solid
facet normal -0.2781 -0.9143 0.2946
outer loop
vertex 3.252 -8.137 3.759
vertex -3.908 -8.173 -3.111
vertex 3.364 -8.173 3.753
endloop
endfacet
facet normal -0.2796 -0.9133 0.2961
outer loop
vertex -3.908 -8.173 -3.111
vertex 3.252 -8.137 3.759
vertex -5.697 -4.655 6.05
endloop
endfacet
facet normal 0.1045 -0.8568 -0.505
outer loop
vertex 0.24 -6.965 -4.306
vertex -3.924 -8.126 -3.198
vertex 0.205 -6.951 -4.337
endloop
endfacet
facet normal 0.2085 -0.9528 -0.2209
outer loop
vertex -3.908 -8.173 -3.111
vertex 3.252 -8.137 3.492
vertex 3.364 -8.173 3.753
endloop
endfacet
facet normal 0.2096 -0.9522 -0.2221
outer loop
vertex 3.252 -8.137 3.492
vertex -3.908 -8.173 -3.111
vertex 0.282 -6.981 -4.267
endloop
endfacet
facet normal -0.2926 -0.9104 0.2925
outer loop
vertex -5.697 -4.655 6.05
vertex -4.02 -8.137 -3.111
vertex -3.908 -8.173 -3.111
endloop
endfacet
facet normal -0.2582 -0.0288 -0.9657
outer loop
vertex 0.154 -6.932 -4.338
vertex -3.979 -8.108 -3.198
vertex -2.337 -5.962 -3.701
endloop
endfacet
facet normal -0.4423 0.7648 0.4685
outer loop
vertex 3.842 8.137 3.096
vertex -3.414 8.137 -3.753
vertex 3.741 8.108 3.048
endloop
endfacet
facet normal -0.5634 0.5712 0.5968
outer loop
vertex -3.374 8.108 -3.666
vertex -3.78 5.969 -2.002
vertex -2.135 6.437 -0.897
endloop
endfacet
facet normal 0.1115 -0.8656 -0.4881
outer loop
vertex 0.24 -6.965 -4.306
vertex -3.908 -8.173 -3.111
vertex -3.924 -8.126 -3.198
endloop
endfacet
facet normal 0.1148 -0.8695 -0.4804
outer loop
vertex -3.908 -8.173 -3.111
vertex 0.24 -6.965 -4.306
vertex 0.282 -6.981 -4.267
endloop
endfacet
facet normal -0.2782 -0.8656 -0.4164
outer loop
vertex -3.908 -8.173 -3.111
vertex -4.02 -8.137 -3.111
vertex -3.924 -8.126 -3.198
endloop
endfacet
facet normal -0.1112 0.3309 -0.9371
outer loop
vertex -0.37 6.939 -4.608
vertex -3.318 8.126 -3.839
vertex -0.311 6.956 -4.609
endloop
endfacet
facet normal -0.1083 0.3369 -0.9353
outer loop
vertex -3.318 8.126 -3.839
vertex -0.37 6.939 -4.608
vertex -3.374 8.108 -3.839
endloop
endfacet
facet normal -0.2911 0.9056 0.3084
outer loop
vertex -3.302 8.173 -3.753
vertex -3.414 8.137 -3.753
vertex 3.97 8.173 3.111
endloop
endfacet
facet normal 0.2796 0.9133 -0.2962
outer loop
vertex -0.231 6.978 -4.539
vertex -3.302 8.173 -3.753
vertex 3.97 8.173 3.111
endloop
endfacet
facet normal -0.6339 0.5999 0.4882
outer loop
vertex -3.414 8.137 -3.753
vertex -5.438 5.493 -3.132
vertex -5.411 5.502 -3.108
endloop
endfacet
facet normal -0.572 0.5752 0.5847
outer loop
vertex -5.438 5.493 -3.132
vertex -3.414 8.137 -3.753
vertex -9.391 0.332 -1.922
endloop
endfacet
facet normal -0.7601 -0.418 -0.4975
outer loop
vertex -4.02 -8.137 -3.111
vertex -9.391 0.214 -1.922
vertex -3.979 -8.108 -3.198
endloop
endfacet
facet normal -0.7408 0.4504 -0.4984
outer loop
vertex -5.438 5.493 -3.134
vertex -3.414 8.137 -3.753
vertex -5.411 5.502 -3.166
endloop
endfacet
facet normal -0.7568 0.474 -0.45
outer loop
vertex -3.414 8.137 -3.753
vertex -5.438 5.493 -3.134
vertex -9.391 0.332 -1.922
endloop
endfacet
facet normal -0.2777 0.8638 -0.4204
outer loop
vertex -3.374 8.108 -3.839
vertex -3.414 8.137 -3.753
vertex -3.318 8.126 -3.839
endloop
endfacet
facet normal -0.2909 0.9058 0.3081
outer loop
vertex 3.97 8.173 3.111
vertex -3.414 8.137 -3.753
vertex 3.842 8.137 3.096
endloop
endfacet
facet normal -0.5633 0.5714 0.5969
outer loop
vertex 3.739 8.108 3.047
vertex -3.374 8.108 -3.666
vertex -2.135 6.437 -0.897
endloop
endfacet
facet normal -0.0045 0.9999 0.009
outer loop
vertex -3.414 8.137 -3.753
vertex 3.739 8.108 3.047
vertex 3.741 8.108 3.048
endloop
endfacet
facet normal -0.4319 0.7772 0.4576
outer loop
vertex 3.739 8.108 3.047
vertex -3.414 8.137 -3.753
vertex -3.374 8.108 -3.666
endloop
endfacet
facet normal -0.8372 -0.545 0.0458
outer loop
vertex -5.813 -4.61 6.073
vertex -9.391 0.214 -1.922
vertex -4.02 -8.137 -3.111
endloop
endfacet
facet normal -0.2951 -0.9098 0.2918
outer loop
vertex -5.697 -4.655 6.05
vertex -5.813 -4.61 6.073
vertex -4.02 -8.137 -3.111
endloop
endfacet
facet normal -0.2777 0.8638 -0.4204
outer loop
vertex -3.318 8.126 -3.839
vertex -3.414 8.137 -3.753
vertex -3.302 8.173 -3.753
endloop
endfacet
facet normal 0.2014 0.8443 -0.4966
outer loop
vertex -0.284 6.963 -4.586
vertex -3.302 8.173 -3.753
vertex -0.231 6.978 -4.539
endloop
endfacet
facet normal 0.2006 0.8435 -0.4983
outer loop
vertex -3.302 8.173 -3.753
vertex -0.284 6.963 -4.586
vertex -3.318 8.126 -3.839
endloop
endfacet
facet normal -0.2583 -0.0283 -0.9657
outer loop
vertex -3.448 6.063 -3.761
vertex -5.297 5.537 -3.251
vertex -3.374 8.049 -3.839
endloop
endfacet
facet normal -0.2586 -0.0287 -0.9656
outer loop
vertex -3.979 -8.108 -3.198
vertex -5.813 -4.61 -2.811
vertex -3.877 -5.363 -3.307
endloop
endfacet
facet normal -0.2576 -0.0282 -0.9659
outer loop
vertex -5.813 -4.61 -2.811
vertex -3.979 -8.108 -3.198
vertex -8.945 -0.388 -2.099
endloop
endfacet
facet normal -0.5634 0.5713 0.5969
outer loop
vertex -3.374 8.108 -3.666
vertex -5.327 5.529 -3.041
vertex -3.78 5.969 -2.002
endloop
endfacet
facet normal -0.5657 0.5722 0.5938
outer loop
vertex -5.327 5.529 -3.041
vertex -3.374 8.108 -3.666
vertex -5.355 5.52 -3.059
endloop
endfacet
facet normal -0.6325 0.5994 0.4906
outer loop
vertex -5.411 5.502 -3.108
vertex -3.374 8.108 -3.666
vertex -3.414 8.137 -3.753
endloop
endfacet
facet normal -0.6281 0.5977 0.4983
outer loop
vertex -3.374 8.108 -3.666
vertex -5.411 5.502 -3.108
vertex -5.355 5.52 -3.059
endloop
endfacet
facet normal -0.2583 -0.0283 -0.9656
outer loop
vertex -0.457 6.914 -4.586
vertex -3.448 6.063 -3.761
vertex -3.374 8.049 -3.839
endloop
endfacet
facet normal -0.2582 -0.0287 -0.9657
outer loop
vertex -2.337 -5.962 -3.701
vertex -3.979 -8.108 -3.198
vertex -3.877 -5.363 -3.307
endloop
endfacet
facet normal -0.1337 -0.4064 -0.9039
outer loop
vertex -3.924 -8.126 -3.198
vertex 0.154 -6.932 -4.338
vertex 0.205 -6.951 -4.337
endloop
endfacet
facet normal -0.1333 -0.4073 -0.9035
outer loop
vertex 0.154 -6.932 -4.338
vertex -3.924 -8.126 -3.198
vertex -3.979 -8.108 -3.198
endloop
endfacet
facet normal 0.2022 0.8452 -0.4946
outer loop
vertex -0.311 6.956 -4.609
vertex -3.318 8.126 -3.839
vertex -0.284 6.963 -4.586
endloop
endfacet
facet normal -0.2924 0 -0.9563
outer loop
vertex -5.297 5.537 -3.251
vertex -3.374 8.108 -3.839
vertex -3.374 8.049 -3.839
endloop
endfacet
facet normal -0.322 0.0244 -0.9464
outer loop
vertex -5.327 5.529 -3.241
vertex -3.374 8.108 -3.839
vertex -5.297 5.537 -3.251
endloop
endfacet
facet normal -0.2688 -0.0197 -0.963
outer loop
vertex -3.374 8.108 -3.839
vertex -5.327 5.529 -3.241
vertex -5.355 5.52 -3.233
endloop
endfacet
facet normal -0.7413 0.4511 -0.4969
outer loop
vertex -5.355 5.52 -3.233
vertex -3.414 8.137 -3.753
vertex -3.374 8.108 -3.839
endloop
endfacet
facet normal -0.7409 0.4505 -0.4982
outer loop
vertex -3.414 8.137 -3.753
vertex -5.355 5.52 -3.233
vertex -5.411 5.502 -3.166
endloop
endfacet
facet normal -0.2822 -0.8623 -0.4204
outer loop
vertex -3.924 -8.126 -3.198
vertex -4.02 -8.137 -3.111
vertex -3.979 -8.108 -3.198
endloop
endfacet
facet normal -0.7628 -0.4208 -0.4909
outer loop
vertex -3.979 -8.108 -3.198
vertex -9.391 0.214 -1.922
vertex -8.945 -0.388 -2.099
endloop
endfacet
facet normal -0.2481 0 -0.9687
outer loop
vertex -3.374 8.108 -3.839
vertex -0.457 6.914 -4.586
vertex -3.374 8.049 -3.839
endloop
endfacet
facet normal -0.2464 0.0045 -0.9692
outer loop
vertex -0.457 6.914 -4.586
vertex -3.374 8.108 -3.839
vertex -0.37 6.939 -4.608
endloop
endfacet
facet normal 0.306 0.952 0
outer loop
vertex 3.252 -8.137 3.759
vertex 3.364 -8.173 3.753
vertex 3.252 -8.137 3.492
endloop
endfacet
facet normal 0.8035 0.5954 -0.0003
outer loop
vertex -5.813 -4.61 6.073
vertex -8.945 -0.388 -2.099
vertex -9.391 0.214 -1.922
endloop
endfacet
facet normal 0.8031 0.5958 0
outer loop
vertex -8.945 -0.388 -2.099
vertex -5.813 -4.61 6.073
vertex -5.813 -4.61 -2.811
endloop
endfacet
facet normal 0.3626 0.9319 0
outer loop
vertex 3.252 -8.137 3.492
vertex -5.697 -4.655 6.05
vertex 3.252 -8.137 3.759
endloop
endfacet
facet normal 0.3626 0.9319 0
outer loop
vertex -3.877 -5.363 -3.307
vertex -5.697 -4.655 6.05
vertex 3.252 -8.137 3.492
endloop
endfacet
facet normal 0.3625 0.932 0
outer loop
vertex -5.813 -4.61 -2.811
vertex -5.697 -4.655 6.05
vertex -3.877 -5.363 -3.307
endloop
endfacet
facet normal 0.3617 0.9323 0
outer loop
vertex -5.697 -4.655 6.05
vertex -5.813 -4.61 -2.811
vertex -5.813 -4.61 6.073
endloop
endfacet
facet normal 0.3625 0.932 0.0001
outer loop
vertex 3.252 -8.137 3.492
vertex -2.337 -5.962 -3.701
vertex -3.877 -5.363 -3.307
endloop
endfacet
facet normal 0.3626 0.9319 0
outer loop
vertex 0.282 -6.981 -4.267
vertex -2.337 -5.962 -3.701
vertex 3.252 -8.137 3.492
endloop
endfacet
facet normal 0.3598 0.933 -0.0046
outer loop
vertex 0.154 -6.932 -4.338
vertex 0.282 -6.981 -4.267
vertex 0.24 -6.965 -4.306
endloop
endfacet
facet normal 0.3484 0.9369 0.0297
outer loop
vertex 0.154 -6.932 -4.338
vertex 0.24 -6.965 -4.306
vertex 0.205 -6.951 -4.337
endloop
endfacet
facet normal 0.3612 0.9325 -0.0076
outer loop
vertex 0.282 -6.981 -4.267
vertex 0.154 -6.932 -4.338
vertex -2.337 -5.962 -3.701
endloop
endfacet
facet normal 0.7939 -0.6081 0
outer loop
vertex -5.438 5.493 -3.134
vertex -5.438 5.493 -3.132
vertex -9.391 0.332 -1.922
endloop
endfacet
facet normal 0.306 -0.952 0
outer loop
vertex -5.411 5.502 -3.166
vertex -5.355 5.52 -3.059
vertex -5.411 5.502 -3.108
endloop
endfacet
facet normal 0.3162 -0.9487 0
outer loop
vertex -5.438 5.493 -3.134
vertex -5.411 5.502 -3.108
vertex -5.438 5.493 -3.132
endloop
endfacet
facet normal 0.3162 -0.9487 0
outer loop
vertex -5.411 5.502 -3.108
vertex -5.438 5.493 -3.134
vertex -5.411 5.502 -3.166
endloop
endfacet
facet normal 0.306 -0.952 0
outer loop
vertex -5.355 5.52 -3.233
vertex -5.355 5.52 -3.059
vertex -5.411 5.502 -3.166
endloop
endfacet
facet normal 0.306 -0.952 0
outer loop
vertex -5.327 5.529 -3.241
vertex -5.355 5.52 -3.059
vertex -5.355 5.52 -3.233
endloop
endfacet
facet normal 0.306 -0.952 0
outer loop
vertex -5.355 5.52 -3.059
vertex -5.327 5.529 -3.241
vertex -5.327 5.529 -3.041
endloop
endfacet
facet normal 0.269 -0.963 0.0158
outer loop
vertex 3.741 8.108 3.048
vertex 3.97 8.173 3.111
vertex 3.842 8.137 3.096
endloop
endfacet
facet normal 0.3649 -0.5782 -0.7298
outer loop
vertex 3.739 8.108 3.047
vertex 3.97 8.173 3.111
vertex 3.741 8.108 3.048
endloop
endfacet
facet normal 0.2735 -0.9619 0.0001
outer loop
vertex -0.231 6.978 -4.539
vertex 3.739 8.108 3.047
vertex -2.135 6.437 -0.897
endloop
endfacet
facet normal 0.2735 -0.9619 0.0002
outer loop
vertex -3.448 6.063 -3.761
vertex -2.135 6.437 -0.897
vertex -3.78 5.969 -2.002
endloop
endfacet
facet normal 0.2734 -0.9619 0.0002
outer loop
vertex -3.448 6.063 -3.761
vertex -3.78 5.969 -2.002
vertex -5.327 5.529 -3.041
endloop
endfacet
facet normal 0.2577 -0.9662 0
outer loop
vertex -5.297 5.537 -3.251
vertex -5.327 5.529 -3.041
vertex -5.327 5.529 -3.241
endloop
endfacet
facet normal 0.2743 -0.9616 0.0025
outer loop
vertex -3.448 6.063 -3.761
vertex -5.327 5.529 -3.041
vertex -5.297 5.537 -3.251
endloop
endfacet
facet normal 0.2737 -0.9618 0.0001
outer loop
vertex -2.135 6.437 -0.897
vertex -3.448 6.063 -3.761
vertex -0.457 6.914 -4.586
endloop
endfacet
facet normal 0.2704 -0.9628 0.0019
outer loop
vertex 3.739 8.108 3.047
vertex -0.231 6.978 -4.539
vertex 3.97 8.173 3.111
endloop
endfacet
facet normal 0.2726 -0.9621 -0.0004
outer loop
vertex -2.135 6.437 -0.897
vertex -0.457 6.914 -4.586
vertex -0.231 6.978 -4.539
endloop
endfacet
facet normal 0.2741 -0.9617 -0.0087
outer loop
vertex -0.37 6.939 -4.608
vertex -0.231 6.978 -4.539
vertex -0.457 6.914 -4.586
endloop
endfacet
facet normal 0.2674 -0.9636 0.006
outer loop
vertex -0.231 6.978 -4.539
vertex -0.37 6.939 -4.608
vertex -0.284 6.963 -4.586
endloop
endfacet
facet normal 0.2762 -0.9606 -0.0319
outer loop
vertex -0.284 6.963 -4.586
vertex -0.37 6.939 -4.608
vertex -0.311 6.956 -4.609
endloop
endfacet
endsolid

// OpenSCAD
// Auto-generated OpenSCAD file

    inner_points = 10*[[0.5357591741651873, -0.543383530882565, 0.5676309916995522], [-0.5731986516605712, -0.45512777948624156, -0.6072977089606933], [0.5731986515218852, 0.45512777955762335, 0.6072977089606933], [-0.5357591743038732, 0.5433835309539468, -0.5676309916995522], [0.3333250709014692, -0.8078126191713554, -0.3752887774762634], [0.3939034177856385, 0.8078126192720669, -0.31110668072560493], [-0.2456533920977693, -0.027272527020831643, 0.9183785262299818], [-0.9310270205482738, 0.02727252704475715, 0.19223265486419908], [0.24565339195908334, 0.027272527092213467, -0.9183785262299818]];

    outer_points = 10*[[-0.3333250709381238, 0.8078126192179577, -0.37528877748181], [-0.39390341794565986, -0.8078126192179577, -0.31110668065861835], [0.39390341794565986, 0.8078126192179577, 0.31110668065861835], [0.3333250709381238, -0.8078126192179577, 0.37528877748181], [-0.9310270204929976, 0.027272527075261566, -0.19223265478667906], [0.24565339210818965, 0.027272527075261566, 0.9183785262080897], [0.5731986515762008, 0.45512777945089933, -0.6072977090281112], [0.5357591741432581, -0.5433835309846493, -0.5676309917221422], [-0.5731986515762008, -0.45512777945089933, 0.6072977090281112]];

    // Convex hull for inner set (I)
    module inner_hull() {
        hull() {
            for (p = inner_points) {
                translate(p) sphere(r=0.1);
            }
        }
    }

    // Convex hull for outer set (O) minus inner hull (O \ I)
    module outer_minus_inner() {
        difference() {
            hull() {
                for (p = outer_points) {
                    translate(p) sphere(r=0.1);
                }
            }
            inner_hull(); // Subtract inner hull
        }
    }

    // Convex hull for outer set (O) minus all translated inner hulls
    module outer_minus_AllTranslationInner() {
        difference() {
            hull() {
                for (p = outer_points) {
                    translate(p) sphere(r=0.1);
                }
            }
            hull() {
                translate([0,0,50]) inner_hull();
                translate([0,0,-50]) inner_hull();
            }; // Subtract translated inner hulls
        }
    }

    // Difference between outer_minus_inner and outer_minus_AllTranslationInner
    module outer_minus_inner_diff() {
        difference() {
            // Outer minus inner
            difference() {
                hull() {
                    for (p = outer_points) {
                        translate(p) sphere(r=0.1);
                    }
                }
                inner_hull();
            }

            // Subtract Outer minus AllTranslationInner
            difference() {
                hull() {
                    for (p = outer_points) {
                        translate(p) sphere(r=0.1);
                    }
                }
                hull() {
                    translate([0,0,50]) inner_hull();
                    translate([0,0,-50]) inner_hull();
                };
            }
        }
    }

    // Rendering all with colors applied
    color([0, 1, 0, 1]) outer_minus_AllTranslationInner(); // Opaque green
    
